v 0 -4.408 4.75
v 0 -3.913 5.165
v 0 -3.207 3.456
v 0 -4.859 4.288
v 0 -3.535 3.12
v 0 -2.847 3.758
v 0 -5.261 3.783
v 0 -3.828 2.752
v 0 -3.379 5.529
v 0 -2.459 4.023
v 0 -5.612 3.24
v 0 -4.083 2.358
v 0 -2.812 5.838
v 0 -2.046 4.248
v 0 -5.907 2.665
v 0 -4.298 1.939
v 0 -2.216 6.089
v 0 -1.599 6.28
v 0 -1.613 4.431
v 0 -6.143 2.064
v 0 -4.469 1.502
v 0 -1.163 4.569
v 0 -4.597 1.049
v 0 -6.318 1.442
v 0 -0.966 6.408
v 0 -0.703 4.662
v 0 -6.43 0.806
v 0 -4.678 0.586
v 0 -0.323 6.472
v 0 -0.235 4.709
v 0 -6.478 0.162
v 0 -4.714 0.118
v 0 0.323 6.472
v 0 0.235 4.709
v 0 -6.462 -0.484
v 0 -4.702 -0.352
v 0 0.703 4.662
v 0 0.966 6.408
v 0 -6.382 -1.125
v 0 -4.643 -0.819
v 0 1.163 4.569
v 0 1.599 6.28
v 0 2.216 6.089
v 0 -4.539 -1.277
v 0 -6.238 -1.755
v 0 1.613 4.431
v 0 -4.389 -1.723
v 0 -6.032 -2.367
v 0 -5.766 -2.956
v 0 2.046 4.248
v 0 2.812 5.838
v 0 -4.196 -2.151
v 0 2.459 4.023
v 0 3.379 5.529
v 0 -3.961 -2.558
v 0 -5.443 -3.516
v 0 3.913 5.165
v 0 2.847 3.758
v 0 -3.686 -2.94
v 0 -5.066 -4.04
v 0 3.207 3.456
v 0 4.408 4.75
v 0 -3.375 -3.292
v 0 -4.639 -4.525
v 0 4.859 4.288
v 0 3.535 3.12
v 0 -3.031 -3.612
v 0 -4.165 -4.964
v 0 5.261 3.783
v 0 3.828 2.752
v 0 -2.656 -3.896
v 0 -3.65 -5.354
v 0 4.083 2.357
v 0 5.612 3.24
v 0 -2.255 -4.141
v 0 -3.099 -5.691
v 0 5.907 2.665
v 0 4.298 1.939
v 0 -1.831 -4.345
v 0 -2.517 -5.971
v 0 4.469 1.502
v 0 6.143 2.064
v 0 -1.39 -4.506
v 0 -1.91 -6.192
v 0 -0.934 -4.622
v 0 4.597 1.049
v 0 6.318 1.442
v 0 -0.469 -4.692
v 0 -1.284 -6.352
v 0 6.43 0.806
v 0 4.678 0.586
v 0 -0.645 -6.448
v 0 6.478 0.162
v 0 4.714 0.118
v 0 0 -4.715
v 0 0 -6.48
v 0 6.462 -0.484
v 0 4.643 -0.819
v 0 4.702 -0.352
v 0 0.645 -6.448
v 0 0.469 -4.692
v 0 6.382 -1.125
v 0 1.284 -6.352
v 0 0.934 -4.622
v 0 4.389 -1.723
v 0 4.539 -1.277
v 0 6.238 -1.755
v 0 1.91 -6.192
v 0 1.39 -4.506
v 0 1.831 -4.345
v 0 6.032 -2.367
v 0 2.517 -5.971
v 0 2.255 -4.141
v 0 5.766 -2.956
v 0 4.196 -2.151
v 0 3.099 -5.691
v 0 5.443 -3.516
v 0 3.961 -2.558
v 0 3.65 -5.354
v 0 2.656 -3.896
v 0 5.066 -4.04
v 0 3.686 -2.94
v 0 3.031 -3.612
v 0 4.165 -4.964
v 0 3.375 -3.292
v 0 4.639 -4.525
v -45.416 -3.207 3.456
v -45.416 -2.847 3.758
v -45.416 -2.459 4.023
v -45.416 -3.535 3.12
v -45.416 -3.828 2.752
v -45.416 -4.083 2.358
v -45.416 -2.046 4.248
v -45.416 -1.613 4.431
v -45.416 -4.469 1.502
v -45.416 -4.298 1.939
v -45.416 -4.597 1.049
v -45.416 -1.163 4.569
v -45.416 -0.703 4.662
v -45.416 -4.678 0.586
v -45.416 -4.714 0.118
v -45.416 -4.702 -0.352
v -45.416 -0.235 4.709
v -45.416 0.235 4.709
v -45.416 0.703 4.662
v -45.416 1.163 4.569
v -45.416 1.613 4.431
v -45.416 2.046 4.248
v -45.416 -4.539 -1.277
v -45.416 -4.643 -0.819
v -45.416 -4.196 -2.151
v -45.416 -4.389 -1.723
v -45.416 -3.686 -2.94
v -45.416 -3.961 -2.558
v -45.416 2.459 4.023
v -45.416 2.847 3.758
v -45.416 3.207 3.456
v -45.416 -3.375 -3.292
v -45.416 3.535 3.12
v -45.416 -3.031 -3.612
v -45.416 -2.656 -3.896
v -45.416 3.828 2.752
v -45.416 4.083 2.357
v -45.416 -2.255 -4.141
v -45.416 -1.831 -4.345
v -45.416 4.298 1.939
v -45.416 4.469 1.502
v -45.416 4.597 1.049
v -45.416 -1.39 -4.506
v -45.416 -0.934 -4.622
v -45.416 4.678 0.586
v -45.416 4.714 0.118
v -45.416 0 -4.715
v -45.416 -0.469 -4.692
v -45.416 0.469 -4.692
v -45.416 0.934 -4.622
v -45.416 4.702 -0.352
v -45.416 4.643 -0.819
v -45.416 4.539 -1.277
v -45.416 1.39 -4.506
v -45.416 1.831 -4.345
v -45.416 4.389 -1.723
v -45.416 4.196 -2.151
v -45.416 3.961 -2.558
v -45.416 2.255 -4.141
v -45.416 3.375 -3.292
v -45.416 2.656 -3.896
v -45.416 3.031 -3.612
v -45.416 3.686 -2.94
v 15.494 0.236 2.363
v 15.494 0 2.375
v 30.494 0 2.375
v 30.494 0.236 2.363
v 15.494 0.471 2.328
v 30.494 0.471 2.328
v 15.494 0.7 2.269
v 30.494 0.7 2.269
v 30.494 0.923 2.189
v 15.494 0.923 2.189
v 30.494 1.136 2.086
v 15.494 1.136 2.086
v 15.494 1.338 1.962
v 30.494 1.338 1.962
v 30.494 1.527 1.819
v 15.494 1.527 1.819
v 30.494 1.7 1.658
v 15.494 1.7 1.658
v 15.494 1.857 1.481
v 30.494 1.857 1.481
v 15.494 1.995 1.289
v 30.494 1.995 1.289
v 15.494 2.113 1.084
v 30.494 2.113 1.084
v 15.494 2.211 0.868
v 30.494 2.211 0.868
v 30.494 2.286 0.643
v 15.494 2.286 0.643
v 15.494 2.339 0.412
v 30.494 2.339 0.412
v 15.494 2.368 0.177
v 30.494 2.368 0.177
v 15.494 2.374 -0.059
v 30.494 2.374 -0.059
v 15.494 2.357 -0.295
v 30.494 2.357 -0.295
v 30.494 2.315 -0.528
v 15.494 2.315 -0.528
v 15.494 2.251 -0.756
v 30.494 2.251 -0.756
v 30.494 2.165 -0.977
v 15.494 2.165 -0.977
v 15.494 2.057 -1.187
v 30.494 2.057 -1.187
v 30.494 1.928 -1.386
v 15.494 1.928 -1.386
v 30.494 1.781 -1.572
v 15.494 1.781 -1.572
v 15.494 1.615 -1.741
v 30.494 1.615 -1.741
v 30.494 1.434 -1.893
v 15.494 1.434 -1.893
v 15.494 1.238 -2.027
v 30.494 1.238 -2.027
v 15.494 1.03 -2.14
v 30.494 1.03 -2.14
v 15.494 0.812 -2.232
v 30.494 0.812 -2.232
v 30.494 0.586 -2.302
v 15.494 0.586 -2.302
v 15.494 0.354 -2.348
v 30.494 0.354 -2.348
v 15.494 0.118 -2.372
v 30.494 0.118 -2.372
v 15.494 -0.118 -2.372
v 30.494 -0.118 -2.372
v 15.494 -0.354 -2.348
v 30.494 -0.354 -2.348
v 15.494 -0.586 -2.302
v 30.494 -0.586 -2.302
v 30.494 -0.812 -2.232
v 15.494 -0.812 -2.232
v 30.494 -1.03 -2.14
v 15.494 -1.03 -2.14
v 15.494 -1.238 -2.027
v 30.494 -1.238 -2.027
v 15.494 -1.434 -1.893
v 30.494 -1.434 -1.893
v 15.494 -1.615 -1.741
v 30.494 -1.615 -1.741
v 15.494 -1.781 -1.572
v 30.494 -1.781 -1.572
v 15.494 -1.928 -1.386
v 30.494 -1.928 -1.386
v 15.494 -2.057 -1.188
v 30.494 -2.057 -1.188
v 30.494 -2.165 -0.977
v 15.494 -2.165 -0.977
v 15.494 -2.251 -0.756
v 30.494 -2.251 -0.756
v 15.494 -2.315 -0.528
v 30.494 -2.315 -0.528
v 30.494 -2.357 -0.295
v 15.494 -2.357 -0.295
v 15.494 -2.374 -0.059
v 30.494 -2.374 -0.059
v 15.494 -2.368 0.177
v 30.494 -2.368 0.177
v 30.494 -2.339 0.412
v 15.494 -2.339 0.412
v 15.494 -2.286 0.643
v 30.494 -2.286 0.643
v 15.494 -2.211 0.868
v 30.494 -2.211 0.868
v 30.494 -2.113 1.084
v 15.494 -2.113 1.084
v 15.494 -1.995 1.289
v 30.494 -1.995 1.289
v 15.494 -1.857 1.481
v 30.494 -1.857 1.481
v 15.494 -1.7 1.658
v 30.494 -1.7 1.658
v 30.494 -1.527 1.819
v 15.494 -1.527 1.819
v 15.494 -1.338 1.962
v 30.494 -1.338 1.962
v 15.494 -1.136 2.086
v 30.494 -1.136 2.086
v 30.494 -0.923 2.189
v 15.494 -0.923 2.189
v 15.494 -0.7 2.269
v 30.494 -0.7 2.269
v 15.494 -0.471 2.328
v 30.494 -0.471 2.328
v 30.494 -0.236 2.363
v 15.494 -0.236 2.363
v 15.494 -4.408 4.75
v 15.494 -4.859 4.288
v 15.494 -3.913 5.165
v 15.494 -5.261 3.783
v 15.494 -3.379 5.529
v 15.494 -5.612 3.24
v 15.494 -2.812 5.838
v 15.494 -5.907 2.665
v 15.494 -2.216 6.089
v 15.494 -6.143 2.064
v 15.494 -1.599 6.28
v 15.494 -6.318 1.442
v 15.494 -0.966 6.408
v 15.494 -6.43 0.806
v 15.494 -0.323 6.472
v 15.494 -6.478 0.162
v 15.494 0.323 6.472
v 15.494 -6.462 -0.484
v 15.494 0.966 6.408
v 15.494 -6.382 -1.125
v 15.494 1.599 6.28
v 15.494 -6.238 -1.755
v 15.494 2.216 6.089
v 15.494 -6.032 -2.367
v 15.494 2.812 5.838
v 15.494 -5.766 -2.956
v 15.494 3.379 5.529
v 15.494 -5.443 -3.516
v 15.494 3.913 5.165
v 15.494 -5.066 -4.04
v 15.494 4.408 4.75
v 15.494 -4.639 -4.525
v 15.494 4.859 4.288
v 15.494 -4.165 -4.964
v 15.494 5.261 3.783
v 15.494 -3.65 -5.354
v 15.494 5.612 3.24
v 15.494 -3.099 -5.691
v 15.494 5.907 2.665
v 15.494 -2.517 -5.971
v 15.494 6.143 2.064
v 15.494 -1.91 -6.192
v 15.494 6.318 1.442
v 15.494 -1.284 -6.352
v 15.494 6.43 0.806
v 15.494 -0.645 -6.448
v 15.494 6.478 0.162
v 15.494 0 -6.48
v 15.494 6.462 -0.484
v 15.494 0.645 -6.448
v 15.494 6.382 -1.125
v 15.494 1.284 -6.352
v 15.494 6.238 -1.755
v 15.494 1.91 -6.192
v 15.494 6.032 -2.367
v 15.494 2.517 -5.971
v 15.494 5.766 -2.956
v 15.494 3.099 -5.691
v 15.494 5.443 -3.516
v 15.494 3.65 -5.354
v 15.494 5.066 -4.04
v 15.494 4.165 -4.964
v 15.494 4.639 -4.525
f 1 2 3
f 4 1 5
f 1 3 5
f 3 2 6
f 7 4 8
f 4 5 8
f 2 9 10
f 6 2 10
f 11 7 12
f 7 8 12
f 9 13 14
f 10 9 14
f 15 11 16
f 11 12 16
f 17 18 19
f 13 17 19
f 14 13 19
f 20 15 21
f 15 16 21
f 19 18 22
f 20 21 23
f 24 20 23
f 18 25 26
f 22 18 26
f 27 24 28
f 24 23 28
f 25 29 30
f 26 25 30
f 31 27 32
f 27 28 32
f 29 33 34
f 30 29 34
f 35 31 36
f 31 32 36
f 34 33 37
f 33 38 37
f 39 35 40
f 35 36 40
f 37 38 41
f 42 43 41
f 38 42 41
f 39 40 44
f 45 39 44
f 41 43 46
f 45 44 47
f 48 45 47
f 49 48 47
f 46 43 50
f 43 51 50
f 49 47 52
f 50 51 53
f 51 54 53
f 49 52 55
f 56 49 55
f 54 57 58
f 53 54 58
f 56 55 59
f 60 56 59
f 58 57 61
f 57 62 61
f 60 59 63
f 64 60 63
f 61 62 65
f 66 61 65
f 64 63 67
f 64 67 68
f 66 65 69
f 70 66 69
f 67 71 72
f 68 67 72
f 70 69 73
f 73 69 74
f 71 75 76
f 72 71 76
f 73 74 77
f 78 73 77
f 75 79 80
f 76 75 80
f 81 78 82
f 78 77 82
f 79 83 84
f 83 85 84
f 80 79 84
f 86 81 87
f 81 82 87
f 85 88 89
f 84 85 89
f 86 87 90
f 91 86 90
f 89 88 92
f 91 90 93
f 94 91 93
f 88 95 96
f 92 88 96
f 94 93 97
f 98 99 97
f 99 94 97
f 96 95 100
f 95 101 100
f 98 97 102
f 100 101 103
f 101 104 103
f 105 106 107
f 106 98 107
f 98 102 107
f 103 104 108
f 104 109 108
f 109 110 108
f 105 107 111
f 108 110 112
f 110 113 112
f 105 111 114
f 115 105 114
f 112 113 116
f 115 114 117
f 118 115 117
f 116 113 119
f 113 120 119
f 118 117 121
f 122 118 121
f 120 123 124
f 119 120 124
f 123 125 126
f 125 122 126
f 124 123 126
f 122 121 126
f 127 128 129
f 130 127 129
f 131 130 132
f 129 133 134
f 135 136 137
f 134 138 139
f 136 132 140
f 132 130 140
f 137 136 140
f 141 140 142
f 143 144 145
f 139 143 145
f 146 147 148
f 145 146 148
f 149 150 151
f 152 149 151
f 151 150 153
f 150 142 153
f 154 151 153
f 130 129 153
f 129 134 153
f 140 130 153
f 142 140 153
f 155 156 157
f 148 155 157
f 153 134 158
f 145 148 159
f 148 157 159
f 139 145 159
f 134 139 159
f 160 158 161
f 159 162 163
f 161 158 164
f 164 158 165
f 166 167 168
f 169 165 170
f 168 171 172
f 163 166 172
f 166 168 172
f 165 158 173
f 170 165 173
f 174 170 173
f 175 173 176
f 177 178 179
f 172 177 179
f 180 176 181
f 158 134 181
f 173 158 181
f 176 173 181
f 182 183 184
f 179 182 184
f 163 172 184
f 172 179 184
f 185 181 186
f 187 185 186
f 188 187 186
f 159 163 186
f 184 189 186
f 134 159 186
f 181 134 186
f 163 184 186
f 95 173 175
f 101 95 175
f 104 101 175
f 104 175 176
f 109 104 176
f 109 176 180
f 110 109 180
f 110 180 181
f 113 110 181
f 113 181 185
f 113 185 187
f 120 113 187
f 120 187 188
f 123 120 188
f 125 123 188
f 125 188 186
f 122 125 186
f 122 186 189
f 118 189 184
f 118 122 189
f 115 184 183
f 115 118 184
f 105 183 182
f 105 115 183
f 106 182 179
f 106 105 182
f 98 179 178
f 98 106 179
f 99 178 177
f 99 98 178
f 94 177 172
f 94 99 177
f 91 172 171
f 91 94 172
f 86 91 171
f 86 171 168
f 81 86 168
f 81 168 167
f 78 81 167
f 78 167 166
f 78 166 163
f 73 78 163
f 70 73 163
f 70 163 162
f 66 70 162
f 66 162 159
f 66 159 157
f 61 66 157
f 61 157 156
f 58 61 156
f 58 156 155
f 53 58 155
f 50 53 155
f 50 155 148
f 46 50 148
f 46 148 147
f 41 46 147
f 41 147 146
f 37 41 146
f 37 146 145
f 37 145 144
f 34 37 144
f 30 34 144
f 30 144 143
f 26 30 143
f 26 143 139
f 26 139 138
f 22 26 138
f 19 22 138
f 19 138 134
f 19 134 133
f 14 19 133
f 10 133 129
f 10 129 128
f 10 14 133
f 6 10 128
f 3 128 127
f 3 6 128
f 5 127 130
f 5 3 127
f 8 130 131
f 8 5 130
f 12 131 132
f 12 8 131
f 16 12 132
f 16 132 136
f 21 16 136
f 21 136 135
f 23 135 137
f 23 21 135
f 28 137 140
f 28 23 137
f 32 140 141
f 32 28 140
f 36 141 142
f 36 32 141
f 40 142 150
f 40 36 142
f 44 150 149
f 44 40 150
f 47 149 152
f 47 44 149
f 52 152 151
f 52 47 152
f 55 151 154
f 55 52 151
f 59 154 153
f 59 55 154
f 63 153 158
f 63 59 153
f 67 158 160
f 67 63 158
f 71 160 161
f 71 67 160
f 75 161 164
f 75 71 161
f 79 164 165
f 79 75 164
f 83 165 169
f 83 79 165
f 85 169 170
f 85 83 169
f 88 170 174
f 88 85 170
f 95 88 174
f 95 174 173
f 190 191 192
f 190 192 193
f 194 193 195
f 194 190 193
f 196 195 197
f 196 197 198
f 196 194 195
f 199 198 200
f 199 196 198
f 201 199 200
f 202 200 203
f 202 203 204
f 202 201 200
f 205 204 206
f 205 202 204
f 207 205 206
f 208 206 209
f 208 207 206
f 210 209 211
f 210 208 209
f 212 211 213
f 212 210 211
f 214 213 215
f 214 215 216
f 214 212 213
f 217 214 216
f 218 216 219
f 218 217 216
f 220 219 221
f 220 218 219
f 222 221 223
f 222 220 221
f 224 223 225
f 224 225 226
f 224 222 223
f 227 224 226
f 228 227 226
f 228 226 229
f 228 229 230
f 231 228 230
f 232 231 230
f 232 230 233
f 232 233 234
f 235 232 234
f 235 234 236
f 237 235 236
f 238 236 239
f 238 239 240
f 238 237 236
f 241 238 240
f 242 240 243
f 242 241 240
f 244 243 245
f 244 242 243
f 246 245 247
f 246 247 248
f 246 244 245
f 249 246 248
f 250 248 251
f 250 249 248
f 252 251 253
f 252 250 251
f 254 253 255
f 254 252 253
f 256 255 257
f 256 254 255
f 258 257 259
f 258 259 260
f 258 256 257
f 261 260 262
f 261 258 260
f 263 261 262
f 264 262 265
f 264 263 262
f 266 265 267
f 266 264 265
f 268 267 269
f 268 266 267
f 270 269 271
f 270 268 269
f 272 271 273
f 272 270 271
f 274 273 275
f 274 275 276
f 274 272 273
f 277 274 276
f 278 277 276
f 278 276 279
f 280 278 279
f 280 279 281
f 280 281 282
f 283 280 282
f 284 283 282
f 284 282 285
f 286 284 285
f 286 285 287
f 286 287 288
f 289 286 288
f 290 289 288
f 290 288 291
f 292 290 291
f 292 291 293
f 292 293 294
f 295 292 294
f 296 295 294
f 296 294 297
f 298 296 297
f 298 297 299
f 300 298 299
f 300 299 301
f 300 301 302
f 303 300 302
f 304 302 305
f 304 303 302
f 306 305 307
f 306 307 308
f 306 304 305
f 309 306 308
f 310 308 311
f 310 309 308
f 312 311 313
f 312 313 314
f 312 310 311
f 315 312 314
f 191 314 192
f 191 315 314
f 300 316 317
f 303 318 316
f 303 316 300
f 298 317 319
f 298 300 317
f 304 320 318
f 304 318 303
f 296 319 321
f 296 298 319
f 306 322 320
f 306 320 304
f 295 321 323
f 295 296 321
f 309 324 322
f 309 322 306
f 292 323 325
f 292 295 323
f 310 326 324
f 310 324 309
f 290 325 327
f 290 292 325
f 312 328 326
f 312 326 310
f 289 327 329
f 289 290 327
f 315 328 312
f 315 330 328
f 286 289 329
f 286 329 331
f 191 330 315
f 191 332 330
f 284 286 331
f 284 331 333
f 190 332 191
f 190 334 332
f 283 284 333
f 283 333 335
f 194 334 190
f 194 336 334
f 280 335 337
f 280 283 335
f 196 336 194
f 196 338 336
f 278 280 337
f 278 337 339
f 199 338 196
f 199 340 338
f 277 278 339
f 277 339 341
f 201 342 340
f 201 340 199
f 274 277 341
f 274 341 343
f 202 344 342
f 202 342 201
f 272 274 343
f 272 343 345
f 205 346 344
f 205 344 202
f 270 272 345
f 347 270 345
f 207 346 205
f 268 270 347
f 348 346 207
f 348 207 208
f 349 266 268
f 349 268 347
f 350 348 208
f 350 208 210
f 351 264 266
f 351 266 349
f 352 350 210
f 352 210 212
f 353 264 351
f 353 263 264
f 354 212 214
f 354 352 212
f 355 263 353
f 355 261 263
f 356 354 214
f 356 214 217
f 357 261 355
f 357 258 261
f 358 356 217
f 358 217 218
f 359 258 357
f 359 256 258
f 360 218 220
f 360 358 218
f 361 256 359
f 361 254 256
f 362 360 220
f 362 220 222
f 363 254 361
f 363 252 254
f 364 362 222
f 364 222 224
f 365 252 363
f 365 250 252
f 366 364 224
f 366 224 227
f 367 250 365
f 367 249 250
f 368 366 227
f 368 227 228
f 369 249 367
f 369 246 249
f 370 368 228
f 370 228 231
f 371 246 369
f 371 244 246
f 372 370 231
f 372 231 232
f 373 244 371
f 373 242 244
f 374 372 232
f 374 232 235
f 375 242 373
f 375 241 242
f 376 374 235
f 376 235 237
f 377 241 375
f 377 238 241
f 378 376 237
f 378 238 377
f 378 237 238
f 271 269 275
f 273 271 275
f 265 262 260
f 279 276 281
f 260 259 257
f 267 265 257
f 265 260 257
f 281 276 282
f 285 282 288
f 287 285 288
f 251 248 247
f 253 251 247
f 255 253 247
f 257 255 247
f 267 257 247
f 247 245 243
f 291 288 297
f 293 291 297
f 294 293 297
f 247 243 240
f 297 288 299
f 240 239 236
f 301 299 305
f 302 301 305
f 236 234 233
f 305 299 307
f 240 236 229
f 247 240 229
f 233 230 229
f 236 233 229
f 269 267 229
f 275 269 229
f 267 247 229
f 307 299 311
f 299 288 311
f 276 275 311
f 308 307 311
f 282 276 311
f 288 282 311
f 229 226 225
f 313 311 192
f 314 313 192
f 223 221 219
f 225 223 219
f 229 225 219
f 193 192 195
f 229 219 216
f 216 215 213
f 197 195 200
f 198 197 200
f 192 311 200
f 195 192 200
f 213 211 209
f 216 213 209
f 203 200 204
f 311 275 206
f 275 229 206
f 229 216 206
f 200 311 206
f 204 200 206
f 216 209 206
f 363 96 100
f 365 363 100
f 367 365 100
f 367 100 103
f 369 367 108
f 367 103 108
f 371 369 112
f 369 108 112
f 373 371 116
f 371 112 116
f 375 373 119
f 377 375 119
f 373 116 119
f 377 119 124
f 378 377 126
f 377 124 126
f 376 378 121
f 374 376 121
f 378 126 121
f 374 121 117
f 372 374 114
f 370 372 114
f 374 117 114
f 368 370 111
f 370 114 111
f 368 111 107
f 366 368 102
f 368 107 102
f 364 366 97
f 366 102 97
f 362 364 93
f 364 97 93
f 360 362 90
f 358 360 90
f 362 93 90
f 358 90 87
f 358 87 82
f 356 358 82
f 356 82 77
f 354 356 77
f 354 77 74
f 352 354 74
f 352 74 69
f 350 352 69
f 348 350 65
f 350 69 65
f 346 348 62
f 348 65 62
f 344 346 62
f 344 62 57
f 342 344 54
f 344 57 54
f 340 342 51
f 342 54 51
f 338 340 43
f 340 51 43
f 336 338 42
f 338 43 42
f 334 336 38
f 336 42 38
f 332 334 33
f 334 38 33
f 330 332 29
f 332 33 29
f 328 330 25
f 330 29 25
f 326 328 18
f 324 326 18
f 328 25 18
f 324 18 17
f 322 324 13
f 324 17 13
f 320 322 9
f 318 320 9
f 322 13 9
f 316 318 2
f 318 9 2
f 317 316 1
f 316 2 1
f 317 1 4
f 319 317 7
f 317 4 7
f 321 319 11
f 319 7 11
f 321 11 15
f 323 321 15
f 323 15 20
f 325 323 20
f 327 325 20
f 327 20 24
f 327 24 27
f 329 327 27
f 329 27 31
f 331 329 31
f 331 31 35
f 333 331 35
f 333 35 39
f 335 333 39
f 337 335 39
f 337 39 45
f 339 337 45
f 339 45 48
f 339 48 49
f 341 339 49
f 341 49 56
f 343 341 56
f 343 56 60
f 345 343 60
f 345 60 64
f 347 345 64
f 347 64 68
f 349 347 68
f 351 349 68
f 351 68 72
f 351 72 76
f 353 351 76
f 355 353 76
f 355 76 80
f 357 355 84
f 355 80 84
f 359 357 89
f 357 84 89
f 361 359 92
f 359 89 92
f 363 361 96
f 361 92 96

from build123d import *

# Parameters (mm, degrees)
SKETCH1_R           = 6.48
BOSS_EXTRUDE1_DEPTH = 15.494
SKETCH2_R           = 4.715
BOSS_EXTRUDE2_DEPTH = 60.91
SKETCH3_R           = 2.375
BOSS_EXTRUDE3_DEPTH = 15


with BuildPart() as part:
    # Sketch1 → Boss-Extrude1 (new body)
    with BuildSketch(Plane.YZ):
        with Locations(Location((0, 0, 0), (0, 0, 270))):
            Circle(SKETCH1_R)
    extrude(amount=BOSS_EXTRUDE1_DEPTH)

    # Sketch2 → Boss-Extrude2 (add)
    with BuildSketch(Plane.YZ.offset(15.494)):
        with Locations(Location((0, 0, 0), (0, 0, 270))):
            Circle(SKETCH2_R)
    extrude(amount=-BOSS_EXTRUDE2_DEPTH)

    # Sketch3 → Boss-Extrude3 (add)
    with BuildSketch(Plane(origin=(15.494, 0, 0), x_dir=(0, -1, 0), z_dir=(-1, 0, 0))):
        with Locations(Location((0, 0, 0), (0, 0, 90))):
            Circle(SKETCH3_R)
    extrude(amount=-BOSS_EXTRUDE3_DEPTH)


solid = part.part
